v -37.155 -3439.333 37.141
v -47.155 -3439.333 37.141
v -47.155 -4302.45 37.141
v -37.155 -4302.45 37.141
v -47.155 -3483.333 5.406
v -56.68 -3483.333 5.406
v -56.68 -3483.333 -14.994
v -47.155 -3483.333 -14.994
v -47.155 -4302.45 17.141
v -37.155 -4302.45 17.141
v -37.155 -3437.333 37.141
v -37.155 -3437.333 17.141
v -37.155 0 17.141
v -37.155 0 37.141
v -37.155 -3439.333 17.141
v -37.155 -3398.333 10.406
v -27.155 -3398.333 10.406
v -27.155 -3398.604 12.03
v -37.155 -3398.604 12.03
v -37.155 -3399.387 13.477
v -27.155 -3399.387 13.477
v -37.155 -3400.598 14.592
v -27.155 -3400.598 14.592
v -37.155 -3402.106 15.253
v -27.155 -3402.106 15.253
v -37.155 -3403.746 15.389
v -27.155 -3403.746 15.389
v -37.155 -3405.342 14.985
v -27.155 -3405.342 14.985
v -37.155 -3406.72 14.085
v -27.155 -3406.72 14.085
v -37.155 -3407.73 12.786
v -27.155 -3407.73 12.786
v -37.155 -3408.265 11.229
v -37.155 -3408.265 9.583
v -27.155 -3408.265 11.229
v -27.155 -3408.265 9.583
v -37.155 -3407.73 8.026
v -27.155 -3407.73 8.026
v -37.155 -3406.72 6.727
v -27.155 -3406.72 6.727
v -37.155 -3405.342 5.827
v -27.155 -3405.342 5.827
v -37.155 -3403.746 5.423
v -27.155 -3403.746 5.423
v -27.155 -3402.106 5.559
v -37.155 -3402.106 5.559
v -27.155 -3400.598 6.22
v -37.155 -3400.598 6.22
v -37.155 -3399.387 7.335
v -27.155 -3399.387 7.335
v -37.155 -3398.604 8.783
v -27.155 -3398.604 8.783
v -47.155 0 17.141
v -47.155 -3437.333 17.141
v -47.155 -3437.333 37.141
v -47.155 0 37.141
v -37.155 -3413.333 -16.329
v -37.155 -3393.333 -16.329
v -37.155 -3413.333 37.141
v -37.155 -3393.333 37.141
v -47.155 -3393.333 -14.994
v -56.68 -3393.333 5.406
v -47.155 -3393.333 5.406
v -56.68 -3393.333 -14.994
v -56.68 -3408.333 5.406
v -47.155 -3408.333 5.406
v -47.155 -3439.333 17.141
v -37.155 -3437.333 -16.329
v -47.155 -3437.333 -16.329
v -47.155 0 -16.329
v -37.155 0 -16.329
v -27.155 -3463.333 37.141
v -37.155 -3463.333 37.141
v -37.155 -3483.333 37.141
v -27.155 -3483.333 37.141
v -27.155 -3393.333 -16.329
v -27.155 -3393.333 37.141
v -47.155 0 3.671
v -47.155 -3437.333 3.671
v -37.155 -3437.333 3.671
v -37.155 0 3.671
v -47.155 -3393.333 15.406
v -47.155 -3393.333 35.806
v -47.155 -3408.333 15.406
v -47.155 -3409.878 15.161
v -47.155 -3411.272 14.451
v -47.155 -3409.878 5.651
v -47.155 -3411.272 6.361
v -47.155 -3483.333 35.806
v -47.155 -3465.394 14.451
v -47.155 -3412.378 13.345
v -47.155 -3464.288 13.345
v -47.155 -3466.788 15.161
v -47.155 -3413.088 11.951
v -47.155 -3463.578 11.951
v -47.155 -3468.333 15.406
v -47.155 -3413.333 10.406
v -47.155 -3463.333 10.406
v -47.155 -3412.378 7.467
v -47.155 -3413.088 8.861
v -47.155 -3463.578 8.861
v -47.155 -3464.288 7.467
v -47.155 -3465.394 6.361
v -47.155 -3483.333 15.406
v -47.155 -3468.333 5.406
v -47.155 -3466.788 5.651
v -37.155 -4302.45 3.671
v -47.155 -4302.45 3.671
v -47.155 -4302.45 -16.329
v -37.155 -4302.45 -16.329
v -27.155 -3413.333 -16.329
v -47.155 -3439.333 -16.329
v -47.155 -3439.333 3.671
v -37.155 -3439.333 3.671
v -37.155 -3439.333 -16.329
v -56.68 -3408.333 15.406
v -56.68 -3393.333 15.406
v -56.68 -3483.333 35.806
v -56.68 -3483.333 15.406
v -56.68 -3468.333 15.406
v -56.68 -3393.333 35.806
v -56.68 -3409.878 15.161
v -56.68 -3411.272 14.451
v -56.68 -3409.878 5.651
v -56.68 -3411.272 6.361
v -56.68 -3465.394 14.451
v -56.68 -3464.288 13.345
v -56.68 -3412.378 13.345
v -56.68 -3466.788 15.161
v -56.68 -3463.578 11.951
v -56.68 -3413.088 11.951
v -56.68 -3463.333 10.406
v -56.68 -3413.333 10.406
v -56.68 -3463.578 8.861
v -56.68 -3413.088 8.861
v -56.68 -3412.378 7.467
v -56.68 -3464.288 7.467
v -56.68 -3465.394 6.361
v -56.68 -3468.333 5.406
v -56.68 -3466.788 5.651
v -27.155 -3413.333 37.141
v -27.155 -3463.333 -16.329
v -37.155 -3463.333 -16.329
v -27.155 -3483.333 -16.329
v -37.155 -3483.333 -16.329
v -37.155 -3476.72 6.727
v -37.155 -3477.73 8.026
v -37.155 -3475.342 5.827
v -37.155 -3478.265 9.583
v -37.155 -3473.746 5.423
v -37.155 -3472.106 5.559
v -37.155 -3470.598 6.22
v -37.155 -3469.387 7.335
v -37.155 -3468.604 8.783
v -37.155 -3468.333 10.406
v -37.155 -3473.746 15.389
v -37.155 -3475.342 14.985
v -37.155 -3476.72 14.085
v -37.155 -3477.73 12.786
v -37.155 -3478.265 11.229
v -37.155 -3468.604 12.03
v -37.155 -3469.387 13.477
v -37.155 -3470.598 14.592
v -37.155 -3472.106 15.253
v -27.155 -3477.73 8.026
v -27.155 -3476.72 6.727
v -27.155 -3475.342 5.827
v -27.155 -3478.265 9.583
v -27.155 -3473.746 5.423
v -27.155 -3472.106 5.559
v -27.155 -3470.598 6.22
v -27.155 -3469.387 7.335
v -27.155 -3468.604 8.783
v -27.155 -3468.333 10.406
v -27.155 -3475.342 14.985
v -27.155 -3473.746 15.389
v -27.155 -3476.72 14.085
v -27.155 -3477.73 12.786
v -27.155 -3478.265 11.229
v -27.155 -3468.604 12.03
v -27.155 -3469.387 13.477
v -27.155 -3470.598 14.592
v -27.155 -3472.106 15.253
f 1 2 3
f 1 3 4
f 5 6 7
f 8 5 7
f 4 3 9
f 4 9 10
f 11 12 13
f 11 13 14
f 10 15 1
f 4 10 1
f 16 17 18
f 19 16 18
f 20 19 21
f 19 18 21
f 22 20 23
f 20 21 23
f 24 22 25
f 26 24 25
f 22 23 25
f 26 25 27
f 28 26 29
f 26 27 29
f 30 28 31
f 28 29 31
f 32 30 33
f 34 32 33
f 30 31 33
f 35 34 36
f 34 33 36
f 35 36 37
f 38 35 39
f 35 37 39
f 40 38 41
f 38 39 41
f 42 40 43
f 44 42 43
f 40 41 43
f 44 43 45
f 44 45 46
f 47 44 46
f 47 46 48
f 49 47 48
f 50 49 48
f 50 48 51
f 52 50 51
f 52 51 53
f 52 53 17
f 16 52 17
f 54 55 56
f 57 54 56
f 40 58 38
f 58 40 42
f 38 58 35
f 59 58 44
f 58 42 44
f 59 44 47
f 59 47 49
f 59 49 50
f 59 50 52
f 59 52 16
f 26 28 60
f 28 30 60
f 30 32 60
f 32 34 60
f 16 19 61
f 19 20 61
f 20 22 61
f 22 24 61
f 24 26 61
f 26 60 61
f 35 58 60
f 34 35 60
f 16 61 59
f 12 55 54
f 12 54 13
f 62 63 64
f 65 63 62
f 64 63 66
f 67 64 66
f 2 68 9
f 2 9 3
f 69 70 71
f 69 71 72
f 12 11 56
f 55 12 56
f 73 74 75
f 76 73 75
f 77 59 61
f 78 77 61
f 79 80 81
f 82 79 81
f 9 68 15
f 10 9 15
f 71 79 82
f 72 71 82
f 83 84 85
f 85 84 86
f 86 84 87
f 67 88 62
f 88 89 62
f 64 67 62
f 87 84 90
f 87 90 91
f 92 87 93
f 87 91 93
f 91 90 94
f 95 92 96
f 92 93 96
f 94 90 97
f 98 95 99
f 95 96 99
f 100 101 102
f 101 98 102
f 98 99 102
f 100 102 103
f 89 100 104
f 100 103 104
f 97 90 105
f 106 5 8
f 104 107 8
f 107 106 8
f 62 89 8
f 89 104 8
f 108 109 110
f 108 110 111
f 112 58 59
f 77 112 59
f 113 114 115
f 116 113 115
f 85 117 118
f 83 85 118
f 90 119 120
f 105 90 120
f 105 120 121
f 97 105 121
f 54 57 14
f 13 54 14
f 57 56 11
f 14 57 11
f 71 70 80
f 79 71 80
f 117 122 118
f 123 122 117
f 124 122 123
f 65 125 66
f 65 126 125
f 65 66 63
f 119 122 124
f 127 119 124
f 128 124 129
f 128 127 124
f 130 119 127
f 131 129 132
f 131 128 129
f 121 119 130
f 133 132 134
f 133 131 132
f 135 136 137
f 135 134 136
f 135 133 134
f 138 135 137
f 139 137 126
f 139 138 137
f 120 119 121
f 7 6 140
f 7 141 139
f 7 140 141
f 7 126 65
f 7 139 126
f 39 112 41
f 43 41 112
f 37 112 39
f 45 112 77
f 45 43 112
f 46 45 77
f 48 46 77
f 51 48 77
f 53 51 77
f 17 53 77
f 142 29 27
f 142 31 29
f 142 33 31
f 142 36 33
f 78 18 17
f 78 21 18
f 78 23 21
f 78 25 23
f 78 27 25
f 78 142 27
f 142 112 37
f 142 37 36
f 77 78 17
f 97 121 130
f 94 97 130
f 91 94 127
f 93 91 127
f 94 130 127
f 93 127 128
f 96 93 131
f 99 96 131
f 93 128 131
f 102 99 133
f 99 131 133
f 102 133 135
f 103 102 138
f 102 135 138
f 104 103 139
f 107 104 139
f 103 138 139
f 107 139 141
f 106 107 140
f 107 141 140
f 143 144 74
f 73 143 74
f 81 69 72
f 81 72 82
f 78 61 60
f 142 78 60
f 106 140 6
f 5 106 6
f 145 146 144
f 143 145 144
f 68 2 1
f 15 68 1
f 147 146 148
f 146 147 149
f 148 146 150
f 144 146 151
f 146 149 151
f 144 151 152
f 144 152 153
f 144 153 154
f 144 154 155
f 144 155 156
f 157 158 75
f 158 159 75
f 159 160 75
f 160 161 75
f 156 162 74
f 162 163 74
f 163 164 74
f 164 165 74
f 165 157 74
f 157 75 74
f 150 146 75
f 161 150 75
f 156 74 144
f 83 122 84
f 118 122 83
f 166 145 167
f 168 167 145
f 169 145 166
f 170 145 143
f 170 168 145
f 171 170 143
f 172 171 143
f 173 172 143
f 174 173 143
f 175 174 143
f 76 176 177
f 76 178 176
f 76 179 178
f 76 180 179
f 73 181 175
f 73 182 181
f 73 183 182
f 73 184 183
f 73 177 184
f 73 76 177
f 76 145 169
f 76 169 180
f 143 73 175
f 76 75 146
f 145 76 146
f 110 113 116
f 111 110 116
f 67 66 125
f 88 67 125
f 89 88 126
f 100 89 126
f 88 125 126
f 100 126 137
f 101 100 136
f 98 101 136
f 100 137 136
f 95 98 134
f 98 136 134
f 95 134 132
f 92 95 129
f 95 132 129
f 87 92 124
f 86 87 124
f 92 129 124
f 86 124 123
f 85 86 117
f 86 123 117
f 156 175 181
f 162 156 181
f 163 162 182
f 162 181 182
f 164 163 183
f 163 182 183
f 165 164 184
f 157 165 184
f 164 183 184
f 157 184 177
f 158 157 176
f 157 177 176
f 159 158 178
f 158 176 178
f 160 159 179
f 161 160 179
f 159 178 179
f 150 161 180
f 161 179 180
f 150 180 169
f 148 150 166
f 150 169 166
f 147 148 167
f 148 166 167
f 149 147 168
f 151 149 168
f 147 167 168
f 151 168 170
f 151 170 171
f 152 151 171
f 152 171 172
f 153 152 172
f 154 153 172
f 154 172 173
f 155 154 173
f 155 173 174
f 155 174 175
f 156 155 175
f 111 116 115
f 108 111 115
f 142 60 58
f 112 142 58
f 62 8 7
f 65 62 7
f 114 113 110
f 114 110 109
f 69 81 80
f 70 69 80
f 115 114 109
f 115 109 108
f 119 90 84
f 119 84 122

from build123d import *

# Parameters (mm, degrees)
F0_W      = 10
F0_H      = 20
F1_DEPTH  = 4302.45
F3_E6_W   = 25.4
F3_E6_H   = 9.525
F3_E5_W   = 25.4
F3_E5_H   = 9.525
F4_DEPTH  = 90
F7_DEPTH  = 10
F9_DEPTH  = 53.47
F10_R     = 5
F11_R     = 5
F12_DEPTH = 10
F14_DEPTH = 9.525


with BuildPart() as f1:
    # F0 (on Front) → F1 (new body)
    with BuildSketch(Plane.XZ):
        with Locations((-42.1546186507, 27.1410486561)):
            Rectangle(F0_W, F0_H)
        with Locations((-42.1546186507, -6.3289513439)):
            Rectangle(F0_W, F0_H)
    extrude(amount=F1_DEPTH)

    # F8 (on face) → F9 (cut, through all)
    with BuildSketch(Plane.XY.offset(37.1410486561)):
        Polygon((-47.1546186507, -3438.3331108093), (-47.1546186507, -3439.3331108093), (-37.1546186507, -3439.3331108093), (-37.1546186507, -3438.3331108093), (-37.1546186507, -3437.3331108093), (-47.1546186507, -3437.3331108093), align=None)
    extrude(amount=-F9_DEPTH, mode=Mode.SUBTRACT)


with BuildPart() as f4:
    # F3_E6 (on explicit) + F3_E5 (on explicit) → F4 (new body)
    with BuildSketch(Plane(origin=(-47.1546186507, -3483.3331108093, 10.4060486561), x_dir=(0, 0, -1), z_dir=(0, 1, 0))):
        with Locations((12.7, 4.7625)):
            Rectangle(F3_E6_W, F3_E6_H)
    with BuildSketch(Plane(origin=(-47.1546186507, -3483.3331108093, 35.8060486561), x_dir=(0, 0, -1), z_dir=(0, 1, 0))):
        with Locations((12.7, 4.7625)):
            Rectangle(F3_E5_W, F3_E5_H)
    extrude(amount=F4_DEPTH)

    # F13 (on face) + F5 (on face) → F14 (cut, through all)
    with BuildSketch(Plane(origin=(-56.6796186507, 0, 0), x_dir=(0, -1, 0), z_dir=(-1, 0, 0))):
        with BuildLine():
            Line((3408.3331108093, 15.4060486561), (3393.3331108093, 15.4060486561))
            Line((3393.3331108093, 15.4060486561), (3393.3331108093, 5.4060486561))
            Line((3393.3331108093, 5.4060486561), (3403.3331108093, 5.4060486561))
            Line((3403.3331108093, 5.4060486561), (3408.3331108093, 5.4060486561))
            ThreePointArc((3408.3331108093, 5.4060486561), (3413.3331108093, 10.4060486561), (3408.3331108093, 15.4060486561))
        make_face()
    with BuildSketch(Plane(origin=(-56.6796186507, 0, 0), x_dir=(0, -1, 0), z_dir=(-1, 0, 0))):
        with BuildLine():
            ThreePointArc((3468.3331108093, 15.4060486561), (3463.3331108093, 10.4060486561), (3468.3331108093, 5.4060486561))
            Line((3468.3331108093, 5.4060486561), (3473.3331108093, 5.4060486561))
            Line((3473.3331108093, 5.4060486561), (3483.3331108093, 5.4060486561))
            Line((3483.3331108093, 5.4060486561), (3483.3331108093, 15.4060486561))
            Line((3483.3331108093, 15.4060486561), (3468.3331108093, 15.4060486561))
        make_face()
    extrude(amount=-F14_DEPTH, mode=Mode.SUBTRACT)


with BuildPart() as f7:
    # F6 (on face) → F7 (new body)
    with BuildSketch(Plane.YZ.offset(-37.1546186507)):
        Polygon((-3483.3331108093, 37.1410486561), (-3483.3331108093, 35.8060486561), (-3483.3331108093, 15.4060486561), (-3483.3331108093, 5.4060486561), (-3483.3331108093, 3.6710486561), (-3463.3331108093, 3.6710486561), (-3463.3331108093, 37.1410486561), align=None)
        Polygon((-3463.3331108093, 3.6710486561), (-3483.3331108093, 3.6710486561), (-3483.3331108093, -14.9939513439), (-3483.3331108093, -16.3289513439), (-3463.3331108093, -16.3289513439), align=None)
        Polygon((-3393.3331108093, 37.1410486561), (-3413.3331108093, 37.1410486561), (-3413.3331108093, 3.6710486561), (-3393.3331108093, 3.6710486561), (-3393.3331108093, 5.4060486561), (-3393.3331108093, 15.4060486561), (-3393.3331108093, 35.8060486561), align=None)
        Polygon((-3393.3331108093, 3.6710486561), (-3413.3331108093, 3.6710486561), (-3413.3331108093, -16.3289513439), (-3393.3331108093, -16.3289513439), (-3393.3331108093, -14.9939513439), align=None)
    extrude(amount=F7_DEPTH)

    # F10 (on face) + F11 (on face) → F12 (cut)
    with BuildSketch(Plane.YZ.offset(-27.1546186507)):
        with Locations((-3473.3331108093, 10.4060486561)):
            Circle(F10_R)
    with BuildSketch(Plane.YZ.offset(-27.1546186507)):
        with Locations((-3403.3331108093, 10.4060486561)):
            Circle(F11_R)
    extrude(amount=-F12_DEPTH, mode=Mode.SUBTRACT)


solid = Compound([f1.part, f4.part, f7.part])
